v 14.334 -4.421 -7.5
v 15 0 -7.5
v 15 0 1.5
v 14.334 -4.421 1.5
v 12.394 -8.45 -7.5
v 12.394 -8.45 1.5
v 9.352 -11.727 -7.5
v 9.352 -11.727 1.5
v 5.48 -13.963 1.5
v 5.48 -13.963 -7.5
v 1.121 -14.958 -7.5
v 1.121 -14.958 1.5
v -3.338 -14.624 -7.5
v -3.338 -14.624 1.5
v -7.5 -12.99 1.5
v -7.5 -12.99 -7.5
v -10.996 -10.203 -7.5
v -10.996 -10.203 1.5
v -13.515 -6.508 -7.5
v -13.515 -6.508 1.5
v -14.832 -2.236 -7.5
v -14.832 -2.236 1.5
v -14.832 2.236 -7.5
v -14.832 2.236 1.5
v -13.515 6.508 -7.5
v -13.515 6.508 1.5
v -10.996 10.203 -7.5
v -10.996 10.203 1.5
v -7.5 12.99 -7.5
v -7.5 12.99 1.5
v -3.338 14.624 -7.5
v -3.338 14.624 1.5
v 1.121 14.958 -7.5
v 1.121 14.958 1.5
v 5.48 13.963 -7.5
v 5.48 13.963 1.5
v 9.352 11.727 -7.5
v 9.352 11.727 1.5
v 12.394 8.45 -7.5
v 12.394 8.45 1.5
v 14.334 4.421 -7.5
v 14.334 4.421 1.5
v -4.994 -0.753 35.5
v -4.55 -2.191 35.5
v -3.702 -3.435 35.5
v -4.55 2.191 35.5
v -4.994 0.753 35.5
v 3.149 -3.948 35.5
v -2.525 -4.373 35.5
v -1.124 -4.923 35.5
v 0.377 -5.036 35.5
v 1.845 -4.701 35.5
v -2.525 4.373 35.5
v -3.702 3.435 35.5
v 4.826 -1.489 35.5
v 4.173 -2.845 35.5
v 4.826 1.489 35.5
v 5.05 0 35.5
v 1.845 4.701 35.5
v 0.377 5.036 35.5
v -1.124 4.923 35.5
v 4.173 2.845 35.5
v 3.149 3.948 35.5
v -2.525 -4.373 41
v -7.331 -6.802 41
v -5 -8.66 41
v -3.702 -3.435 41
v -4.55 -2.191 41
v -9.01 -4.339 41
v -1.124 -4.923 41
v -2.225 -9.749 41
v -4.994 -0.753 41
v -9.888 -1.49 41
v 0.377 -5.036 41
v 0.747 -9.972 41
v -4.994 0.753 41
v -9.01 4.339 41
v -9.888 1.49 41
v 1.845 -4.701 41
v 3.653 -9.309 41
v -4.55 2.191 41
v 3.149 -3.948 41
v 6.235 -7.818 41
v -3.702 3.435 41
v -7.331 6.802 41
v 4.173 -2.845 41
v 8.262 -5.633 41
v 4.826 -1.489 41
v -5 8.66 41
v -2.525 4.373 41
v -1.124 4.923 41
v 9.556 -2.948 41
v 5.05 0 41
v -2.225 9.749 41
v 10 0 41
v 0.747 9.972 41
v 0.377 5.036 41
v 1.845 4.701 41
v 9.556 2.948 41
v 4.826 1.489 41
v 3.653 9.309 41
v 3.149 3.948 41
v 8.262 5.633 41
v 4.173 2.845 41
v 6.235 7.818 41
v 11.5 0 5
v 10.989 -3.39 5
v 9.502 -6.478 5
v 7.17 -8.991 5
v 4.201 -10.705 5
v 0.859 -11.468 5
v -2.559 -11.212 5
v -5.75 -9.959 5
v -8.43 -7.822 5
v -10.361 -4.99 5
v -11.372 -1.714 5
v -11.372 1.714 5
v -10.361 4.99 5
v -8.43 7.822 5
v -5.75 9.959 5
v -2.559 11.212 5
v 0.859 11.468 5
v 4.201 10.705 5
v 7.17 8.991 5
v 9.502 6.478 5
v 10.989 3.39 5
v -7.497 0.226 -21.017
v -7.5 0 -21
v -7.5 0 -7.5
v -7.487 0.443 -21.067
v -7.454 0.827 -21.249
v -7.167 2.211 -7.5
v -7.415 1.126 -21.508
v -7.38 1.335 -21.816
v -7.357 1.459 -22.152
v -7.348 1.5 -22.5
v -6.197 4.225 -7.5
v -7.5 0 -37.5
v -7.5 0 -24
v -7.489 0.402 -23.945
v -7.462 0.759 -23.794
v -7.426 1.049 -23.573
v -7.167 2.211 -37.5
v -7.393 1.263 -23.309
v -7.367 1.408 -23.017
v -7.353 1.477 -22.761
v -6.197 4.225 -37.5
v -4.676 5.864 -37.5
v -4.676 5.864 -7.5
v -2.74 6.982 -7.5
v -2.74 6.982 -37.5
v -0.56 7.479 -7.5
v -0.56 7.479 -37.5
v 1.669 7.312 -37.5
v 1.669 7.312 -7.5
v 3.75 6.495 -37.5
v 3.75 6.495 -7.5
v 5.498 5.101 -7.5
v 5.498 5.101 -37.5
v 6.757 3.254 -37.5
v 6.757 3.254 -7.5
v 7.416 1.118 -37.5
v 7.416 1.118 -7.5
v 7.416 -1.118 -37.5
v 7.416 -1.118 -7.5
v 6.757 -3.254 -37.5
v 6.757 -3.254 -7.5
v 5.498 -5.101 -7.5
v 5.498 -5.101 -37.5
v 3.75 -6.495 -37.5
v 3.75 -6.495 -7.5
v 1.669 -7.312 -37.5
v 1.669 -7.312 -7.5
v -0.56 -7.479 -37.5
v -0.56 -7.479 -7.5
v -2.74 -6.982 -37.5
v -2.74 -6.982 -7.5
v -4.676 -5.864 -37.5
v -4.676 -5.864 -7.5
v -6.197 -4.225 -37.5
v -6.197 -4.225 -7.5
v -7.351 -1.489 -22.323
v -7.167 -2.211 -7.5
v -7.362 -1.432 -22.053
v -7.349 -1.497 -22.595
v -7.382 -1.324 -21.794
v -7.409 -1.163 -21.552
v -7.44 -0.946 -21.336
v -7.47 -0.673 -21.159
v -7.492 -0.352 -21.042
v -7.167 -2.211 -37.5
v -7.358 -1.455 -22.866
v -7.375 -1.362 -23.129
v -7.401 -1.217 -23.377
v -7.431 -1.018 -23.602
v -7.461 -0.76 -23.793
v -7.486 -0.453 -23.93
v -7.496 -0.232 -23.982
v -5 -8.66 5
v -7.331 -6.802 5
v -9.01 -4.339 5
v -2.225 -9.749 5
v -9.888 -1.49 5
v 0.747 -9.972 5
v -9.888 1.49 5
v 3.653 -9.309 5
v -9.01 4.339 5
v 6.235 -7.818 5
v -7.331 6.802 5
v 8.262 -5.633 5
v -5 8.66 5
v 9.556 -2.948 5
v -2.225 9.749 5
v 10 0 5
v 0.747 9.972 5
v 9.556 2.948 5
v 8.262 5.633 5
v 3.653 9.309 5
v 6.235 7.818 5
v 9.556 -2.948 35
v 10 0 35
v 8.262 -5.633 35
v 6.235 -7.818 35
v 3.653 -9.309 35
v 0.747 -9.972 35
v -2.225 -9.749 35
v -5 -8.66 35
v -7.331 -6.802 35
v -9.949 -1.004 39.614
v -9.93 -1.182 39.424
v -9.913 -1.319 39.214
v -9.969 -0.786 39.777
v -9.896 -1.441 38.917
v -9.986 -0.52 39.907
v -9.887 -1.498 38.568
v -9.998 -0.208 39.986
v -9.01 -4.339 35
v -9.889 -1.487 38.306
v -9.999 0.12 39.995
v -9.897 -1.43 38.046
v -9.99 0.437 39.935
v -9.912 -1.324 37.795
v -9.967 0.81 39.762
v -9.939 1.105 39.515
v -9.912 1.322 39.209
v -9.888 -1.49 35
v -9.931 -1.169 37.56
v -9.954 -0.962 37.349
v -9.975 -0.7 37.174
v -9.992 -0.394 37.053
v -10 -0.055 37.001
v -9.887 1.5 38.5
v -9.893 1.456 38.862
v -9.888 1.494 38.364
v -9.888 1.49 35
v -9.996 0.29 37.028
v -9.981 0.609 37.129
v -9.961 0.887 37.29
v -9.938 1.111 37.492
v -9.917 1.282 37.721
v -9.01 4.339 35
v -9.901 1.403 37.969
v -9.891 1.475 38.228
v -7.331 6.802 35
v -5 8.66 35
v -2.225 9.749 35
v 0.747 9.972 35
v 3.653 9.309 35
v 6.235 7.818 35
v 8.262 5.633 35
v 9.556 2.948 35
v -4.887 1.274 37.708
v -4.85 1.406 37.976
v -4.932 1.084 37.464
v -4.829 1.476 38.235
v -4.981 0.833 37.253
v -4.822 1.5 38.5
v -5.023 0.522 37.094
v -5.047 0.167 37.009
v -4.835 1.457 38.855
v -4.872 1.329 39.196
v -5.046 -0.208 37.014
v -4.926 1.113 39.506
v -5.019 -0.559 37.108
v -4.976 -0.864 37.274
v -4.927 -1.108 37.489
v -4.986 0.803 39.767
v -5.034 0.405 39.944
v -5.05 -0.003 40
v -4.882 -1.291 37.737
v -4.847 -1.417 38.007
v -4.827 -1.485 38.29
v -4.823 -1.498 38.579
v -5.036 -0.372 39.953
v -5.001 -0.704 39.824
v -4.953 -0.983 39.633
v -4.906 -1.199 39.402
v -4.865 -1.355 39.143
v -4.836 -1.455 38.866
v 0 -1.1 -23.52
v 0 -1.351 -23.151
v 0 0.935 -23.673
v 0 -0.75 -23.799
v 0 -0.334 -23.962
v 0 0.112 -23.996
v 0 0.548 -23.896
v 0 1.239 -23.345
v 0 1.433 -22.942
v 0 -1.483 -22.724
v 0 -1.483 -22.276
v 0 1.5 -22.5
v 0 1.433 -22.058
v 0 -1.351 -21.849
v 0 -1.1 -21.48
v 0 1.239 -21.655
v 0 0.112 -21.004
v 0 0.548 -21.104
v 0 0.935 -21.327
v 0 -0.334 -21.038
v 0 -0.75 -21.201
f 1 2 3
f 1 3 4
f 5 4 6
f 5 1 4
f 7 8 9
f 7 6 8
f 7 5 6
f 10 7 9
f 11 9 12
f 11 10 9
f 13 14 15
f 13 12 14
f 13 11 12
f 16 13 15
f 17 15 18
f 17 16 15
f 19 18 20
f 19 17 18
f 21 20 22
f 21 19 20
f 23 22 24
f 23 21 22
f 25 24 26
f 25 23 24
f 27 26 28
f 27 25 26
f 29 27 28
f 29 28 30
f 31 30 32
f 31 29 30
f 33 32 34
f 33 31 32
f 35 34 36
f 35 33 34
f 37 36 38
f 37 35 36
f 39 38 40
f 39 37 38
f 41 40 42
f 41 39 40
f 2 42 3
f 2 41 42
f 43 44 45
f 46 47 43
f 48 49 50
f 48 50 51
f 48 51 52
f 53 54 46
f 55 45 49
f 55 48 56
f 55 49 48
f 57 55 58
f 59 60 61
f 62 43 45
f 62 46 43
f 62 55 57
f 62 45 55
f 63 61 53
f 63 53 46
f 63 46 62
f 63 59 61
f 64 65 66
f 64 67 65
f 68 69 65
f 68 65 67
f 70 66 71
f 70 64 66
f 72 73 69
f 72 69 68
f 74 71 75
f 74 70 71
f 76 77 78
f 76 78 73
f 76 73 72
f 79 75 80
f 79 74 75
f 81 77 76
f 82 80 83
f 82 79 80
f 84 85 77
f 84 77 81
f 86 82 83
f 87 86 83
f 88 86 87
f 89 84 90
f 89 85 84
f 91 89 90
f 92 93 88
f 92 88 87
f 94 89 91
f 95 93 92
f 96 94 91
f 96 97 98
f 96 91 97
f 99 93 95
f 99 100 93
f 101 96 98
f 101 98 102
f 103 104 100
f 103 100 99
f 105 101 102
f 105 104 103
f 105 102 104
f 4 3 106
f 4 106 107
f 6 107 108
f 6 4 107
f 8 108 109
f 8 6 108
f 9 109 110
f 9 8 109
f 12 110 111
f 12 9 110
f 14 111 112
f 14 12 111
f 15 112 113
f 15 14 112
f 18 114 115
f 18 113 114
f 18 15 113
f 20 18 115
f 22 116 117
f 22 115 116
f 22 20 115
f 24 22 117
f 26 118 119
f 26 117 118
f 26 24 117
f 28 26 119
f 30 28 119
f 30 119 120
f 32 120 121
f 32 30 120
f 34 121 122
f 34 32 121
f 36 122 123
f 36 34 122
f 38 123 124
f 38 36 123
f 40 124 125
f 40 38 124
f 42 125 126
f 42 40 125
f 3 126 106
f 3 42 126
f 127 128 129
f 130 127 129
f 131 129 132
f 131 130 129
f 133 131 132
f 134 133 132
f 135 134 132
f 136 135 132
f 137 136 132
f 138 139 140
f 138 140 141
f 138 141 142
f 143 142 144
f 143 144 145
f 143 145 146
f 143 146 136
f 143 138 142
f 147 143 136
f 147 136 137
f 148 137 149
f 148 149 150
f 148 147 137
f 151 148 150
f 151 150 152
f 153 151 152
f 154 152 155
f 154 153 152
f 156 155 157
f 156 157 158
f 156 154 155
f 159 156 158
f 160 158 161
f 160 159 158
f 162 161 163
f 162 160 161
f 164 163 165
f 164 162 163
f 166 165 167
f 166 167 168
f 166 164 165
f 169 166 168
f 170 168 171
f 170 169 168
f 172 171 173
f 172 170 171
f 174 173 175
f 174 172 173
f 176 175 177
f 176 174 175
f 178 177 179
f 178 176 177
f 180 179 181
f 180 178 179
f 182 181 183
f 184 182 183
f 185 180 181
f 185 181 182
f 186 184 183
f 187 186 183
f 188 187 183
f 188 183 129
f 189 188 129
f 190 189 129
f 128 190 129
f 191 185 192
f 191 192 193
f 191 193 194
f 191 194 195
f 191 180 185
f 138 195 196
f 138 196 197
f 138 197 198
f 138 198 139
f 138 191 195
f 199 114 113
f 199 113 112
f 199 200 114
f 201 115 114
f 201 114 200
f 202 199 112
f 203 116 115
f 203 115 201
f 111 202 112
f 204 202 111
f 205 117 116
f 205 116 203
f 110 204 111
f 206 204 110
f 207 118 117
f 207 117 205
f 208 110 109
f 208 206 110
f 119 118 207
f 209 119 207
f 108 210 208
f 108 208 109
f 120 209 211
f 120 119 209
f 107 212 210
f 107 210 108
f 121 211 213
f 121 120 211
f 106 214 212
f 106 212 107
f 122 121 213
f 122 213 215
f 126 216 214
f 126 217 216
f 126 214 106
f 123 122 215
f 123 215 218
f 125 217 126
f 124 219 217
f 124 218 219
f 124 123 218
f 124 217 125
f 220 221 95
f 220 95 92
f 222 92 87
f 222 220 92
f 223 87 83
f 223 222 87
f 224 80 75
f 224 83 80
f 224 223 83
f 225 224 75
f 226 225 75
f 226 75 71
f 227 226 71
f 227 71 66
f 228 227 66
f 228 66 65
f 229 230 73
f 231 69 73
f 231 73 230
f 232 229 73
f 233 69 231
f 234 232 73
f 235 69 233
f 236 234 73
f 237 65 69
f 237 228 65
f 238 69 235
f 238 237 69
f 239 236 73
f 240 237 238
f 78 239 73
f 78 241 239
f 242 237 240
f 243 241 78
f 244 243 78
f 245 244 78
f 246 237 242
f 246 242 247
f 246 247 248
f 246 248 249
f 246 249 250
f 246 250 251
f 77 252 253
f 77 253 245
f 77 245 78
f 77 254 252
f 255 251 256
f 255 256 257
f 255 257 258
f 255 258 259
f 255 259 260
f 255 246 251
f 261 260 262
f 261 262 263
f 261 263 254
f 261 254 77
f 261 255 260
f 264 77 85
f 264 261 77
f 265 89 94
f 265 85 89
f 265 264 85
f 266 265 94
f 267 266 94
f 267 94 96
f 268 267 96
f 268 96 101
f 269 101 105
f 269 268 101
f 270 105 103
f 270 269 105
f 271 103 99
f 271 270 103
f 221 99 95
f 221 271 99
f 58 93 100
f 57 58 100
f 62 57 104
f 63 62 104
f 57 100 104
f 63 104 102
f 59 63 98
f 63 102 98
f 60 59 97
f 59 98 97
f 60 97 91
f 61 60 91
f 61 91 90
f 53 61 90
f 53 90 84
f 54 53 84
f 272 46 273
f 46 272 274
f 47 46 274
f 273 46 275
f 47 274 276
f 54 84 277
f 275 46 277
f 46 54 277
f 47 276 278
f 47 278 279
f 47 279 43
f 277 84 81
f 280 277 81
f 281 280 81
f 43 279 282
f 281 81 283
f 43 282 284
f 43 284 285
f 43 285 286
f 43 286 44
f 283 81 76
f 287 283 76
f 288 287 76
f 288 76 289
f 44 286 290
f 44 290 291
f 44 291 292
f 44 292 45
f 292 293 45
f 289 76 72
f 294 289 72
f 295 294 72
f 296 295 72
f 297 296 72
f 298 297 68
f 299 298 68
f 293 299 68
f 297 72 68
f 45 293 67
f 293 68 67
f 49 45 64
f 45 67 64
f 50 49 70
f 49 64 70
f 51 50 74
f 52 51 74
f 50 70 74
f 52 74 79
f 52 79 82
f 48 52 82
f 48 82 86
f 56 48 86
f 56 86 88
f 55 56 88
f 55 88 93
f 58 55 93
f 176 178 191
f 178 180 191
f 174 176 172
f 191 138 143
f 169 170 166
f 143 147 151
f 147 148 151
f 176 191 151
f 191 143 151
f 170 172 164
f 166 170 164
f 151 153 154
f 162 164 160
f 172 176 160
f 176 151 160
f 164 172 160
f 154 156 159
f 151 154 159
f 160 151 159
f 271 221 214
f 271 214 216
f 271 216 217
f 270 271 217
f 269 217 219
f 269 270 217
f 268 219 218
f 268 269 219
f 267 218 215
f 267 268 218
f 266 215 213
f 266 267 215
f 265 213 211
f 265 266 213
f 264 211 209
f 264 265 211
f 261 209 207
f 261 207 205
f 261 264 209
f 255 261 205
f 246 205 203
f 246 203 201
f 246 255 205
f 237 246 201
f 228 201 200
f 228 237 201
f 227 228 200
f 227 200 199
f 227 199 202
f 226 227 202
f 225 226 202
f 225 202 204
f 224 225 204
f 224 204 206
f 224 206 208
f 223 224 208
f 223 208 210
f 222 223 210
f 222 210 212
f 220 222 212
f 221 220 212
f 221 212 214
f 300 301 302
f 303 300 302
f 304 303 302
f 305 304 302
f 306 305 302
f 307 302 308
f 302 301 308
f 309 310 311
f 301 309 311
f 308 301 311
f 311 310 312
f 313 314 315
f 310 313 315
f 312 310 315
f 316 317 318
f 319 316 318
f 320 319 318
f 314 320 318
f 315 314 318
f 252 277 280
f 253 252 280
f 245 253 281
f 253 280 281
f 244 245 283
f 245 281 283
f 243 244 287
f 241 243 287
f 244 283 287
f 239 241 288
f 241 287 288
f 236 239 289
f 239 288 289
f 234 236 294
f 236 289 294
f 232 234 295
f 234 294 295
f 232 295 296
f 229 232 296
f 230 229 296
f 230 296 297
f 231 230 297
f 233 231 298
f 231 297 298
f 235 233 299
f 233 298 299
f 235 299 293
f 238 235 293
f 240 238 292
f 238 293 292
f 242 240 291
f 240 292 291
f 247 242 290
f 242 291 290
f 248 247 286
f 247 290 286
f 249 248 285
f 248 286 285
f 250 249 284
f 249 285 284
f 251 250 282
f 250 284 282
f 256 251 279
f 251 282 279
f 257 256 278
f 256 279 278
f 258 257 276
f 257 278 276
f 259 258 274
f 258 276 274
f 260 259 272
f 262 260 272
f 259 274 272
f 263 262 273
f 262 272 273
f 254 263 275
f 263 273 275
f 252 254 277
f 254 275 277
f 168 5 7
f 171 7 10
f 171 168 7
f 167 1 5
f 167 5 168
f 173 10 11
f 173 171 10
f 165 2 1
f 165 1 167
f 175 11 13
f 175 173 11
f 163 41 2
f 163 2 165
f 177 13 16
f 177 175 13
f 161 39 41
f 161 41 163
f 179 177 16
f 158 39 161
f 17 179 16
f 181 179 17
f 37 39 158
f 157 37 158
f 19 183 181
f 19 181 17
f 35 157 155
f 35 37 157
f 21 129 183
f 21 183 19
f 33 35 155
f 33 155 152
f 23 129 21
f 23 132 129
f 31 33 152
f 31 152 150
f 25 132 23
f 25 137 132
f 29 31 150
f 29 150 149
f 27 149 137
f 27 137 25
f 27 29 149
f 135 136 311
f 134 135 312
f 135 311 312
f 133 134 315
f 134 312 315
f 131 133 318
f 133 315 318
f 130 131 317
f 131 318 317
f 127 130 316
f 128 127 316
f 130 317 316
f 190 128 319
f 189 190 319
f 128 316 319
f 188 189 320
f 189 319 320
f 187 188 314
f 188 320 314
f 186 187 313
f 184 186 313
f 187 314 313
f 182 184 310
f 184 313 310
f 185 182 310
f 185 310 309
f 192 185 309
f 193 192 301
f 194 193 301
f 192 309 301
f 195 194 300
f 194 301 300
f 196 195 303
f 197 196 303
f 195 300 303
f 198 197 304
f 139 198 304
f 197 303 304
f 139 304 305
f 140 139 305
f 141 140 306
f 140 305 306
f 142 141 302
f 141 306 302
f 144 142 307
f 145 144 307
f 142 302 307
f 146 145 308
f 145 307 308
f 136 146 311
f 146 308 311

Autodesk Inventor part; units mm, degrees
ref_plane "YZ Plane" through (0, 0, 0) normal (1, 0, 0) x (0, 1, 0)
ref_plane "XZ Plane" through (0, 0, 0) normal (0, 1, 0) x (-1, 0, 0)
ref_plane "XY Plane" through (0, 0, 0) normal (0, 0, 1) x (1, 0, 0)
sketch "Szkic1" plane through (0, 0, 0) normal (0, 0, 1) x (1, 0, 0)
  circle A0 centre (0, 0) radius 15
  dimension "d0" = 30
extrude "Wyciągnięcie proste1" add sketch "Szkic1" along normal blind 35 and the other way blind 37.5
sketch "Szkic3" plane through (0, 0, 35) normal (0, 0, 1) x (1, 0, 0)
  circle A0 centre (0, 0) radius 10
  circle A1 centre (0, 0) radius 15
  dimension "d4" = 20
  dimension "d5" = 30
extrude "Wyciągnięcie proste2" cut sketch "Szkic3" against normal blind 30
chamfer "Faza1" distance 3.5 angle 45 1 edges at (-15, 0, 5)
sketch "Szkic4" plane through (0, 0, -37.5) normal (0, 0, -1) x (-1, 0, 0)
  circle A0 centre (0, 0) radius 7.5
  circle A1 centre (0, 0) radius 15
  dimension "d11" = 15
  dimension "d12" = 30
extrude "Wyciągnięcie proste3" cut sketch "Szkic4" against normal blind 30
sketch "Szkic8" plane through (0, 0, 35) normal (0, 0, 1) x (1, 0, 0)
  circle A0 centre (0, 0) radius 10
  dimension "d33" = 20
extrude "Wyciągnięcie proste7" add sketch "Szkic8" along normal blind 6
sketch "Szkic9" plane through (0, 0, 41) normal (0, 0, 1) x (1, 0, 0)
  circle A0 centre (0, 0) radius 5.05
  dimension "d36" = 10.1
extrude "Wyciągnięcie proste8" cut sketch "Szkic9" against normal blind 5.5
sketch "Szkic10" plane through (0, 0, 0) normal (1, 0, 0) x (0, 1, 0)
  circle A0 centre (0, 38.5) radius 1.5
  line L0 (-5.05, 41) -> (5.05, 41) projected
  point P0 (0, 0)
  dimension "d39" = 3
  dimension "d42" = 2.5
extrude "Wyciągnięcie proste9" cut sketch "Szkic10" against normal blind 25
thread "Gwint4" size "M3x0.5" class "6H" standard "ANSI Metric M Profile" full length
sketch "Szkic11" plane through (0, 0, 0) normal (1, 0, 0) x (0, 1, 0)
  circle A0 centre (0, -22.5) radius 1.5
  point P0 (0, 0)
  dimension "d45" = 3
extrude "Wyciągnięcie proste10" cut sketch "Szkic11" against normal blind 20
thread "Gwint5" size "M3x0.5" class "6H" standard "ANSI Metric M Profile" full length
properties part number "koncowka" material "Aluminium 6061"
